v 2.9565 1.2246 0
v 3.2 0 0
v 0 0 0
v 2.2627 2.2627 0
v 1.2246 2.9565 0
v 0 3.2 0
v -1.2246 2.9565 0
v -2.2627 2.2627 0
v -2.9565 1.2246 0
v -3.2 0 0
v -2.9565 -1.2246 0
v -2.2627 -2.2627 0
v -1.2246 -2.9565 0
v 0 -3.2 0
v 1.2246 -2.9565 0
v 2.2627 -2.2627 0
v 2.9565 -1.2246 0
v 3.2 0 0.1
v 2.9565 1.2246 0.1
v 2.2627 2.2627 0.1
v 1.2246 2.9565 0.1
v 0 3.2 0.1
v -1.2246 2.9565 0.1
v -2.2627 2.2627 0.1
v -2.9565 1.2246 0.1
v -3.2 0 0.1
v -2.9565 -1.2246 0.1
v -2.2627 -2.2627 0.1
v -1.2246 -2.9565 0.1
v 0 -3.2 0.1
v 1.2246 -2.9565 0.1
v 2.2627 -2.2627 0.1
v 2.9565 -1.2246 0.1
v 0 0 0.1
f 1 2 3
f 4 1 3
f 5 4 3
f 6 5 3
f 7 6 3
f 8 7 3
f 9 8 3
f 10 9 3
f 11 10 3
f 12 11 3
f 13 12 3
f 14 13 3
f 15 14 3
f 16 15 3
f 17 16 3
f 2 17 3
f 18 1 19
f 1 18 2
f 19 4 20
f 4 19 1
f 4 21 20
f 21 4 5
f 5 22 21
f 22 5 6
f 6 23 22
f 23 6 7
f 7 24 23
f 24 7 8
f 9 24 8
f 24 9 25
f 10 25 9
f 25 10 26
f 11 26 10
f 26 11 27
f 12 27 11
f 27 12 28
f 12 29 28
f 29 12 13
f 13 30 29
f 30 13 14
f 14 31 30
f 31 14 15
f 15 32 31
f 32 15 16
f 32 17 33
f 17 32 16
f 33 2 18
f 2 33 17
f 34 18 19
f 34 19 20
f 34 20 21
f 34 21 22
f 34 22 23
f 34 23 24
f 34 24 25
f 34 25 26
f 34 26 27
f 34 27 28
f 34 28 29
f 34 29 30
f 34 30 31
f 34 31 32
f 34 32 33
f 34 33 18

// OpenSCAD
// file: ../p/4-4cyli.scad
use <../lib.scad>
function ldraw_lib__4_4cyli() = [
// 0 Cylinder 1.0
// 0 Name: 4-4cyli.dat
// 0 Author: James Jessiman
// 0 !LDRAW_ORG Primitive UPDATE 2005-01
// 0 !LICENSE Licensed under CC BY 4.0 : see CAreadme.txt
// 
// 0 BFC CERTIFY CCW
  [0,"BFC","CERTIFY"],
  [0,"BFC","CCW"],
// 
// 0 !HISTORY 1998-12-15 [PTadmin] Official Update 1998-10
// 0 !HISTORY 2002-03-23 [sbliss] Added BFC statement; merged headers from files in distributions LDraw 0.27 and Complete.
// 0 !HISTORY 2002-04-25 [PTadmin] Official Update 2002-02
// 0 !HISTORY 2004-12-14 [guyvivan] BFC CCW
// 0 !HISTORY 2005-12-28 [PTadmin] Official Update 2005-01
// 0 !HISTORY 2007-06-24 [PTadmin] Header formatted for Contributor Agreement
// 0 !HISTORY 2008-07-01 [PTadmin] Official Update 2008-01
// 
// 
// 4 16 1 1 0 0.9239 1 0.3827 0.9239 0 0.3827 1 0 0
  [4,16,1,1,0,0.9239,1,0.3827,0.9239,0,0.3827,1,0,0],
// 5 24 1 0 0 1 1 0 0.9239 0 0.3827 0.9239 0 -0.3827
  [5,24,1,0,0,1,1,0,0.9239,0,0.3827,0.9239,0,-0.3827],
// 4 16 0.9239 1 0.3827 0.7071 1 0.7071 0.7071 0 0.7071 0.9239 0 0.3827
  [4,16,0.9239,1,0.3827,0.7071,1,0.7071,0.7071,0,0.7071,0.9239,0,0.3827],
// 5 24 0.9239 0 0.3827 0.9239 1 0.3827 0.7071 0 0.7071 1 0 0
  [5,24,0.9239,0,0.3827,0.9239,1,0.3827,0.7071,0,0.7071,1,0,0],
// 4 16 0.7071 1 0.7071 0.3827 1 0.9239 0.3827 0 0.9239 0.7071 0 0.7071
  [4,16,0.7071,1,0.7071,0.3827,1,0.9239,0.3827,0,0.9239,0.7071,0,0.7071],
// 5 24 0.7071 0 0.7071 0.7071 1 0.7071 0.3827 0 0.9239 0.9239 0 0.3827
  [5,24,0.7071,0,0.7071,0.7071,1,0.7071,0.3827,0,0.9239,0.9239,0,0.3827],
// 4 16 0.3827 1 0.9239 0 1 1 0 0 1 0.3827 0 0.9239
  [4,16,0.3827,1,0.9239,0,1,1,0,0,1,0.3827,0,0.9239],
// 5 24 0.3827 0 0.9239 0.3827 1 0.9239 0 0 1 0.7071 0 0.7071
  [5,24,0.3827,0,0.9239,0.3827,1,0.9239,0,0,1,0.7071,0,0.7071],
// 4 16 0 1 1 -0.3827 1 0.9239 -0.3827 0 0.9239 0 0 1
  [4,16,0,1,1,-0.3827,1,0.9239,-0.3827,0,0.9239,0,0,1],
// 5 24 0 0 1 0 1 1 -0.3827 0 0.9239 0.3827 0 0.9239
  [5,24,0,0,1,0,1,1,-0.3827,0,0.9239,0.3827,0,0.9239],
// 4 16 -0.3827 1 0.9239 -0.7071 1 0.7071 -0.7071 0 0.7071 -0.3827 0 0.9239
  [4,16,-0.3827,1,0.9239,-0.7071,1,0.7071,-0.7071,0,0.7071,-0.3827,0,0.9239],
// 5 24 -0.3827 0 0.9239 -0.3827 1 0.9239 -0.7071 0 0.7071 0 0 1
  [5,24,-0.3827,0,0.9239,-0.3827,1,0.9239,-0.7071,0,0.7071,0,0,1],
// 4 16 -0.7071 1 0.7071 -0.9239 1 0.3827 -0.9239 0 0.3827 -0.7071 0 0.7071
  [4,16,-0.7071,1,0.7071,-0.9239,1,0.3827,-0.9239,0,0.3827,-0.7071,0,0.7071],
// 5 24 -0.7071 0 0.7071 -0.7071 1 0.7071 -0.9239 0 0.3827 -0.3827 0 0.9239
  [5,24,-0.7071,0,0.7071,-0.7071,1,0.7071,-0.9239,0,0.3827,-0.3827,0,0.9239],
// 4 16 -0.9239 1 0.3827 -1 1 0 -1 0 0 -0.9239 0 0.3827
  [4,16,-0.9239,1,0.3827,-1,1,0,-1,0,0,-0.9239,0,0.3827],
// 5 24 -0.9239 0 0.3827 -0.9239 1 0.3827 -1 0 0 -0.7071 0 0.7071
  [5,24,-0.9239,0,0.3827,-0.9239,1,0.3827,-1,0,0,-0.7071,0,0.7071],
// 4 16 -1 1 0 -0.9239 1 -0.3827 -0.9239 0 -0.3827 -1 0 0
  [4,16,-1,1,0,-0.9239,1,-0.3827,-0.9239,0,-0.3827,-1,0,0],
// 5 24 -1 0 0 -1 1 0 -0.9239 0 -0.3827 -0.9239 0 0.3827
  [5,24,-1,0,0,-1,1,0,-0.9239,0,-0.3827,-0.9239,0,0.3827],
// 4 16 -0.9239 1 -0.3827 -0.7071 1 -0.7071 -0.7071 0 -0.7071 -0.9239 0 -0.3827
  [4,16,-0.9239,1,-0.3827,-0.7071,1,-0.7071,-0.7071,0,-0.7071,-0.9239,0,-0.3827],
// 5 24 -0.9239 0 -0.3827 -0.9239 1 -0.3827 -0.7071 0 -0.7071 -1 0 0
  [5,24,-0.9239,0,-0.3827,-0.9239,1,-0.3827,-0.7071,0,-0.7071,-1,0,0],
// 4 16 -0.7071 1 -0.7071 -0.3827 1 -0.9239 -0.3827 0 -0.9239 -0.7071 0 -0.7071
  [4,16,-0.7071,1,-0.7071,-0.3827,1,-0.9239,-0.3827,0,-0.9239,-0.7071,0,-0.7071],
// 5 24 -0.7071 0 -0.7071 -0.7071 1 -0.7071 -0.3827 0 -0.9239 -0.9239 0 -0.3827
  [5,24,-0.7071,0,-0.7071,-0.7071,1,-0.7071,-0.3827,0,-0.9239,-0.9239,0,-0.3827],
// 4 16 -0.3827 1 -0.9239 0 1 -1 0 0 -1 -0.3827 0 -0.9239
  [4,16,-0.3827,1,-0.9239,0,1,-1,0,0,-1,-0.3827,0,-0.9239],
// 5 24 -0.3827 0 -0.9239 -0.3827 1 -0.9239 0 0 -1 -0.7071 0 -0.7071
  [5,24,-0.3827,0,-0.9239,-0.3827,1,-0.9239,0,0,-1,-0.7071,0,-0.7071],
// 4 16 0 1 -1 0.3827 1 -0.9239 0.3827 0 -0.9239 0 0 -1
  [4,16,0,1,-1,0.3827,1,-0.9239,0.3827,0,-0.9239,0,0,-1],
// 5 24 0 0 -1 0 1 -1 0.3827 0 -0.9239 -0.3827 0 -0.9239
  [5,24,0,0,-1,0,1,-1,0.3827,0,-0.9239,-0.3827,0,-0.9239],
// 4 16 0.3827 1 -0.9239 0.7071 1 -0.7071 0.7071 0 -0.7071 0.3827 0 -0.9239
  [4,16,0.3827,1,-0.9239,0.7071,1,-0.7071,0.7071,0,-0.7071,0.3827,0,-0.9239],
// 5 24 0.3827 0 -0.9239 0.3827 1 -0.9239 0.7071 0 -0.7071 0 0 -1
  [5,24,0.3827,0,-0.9239,0.3827,1,-0.9239,0.7071,0,-0.7071,0,0,-1],
// 4 16 0.7071 1 -0.7071 0.9239 1 -0.3827 0.9239 0 -0.3827 0.7071 0 -0.7071
  [4,16,0.7071,1,-0.7071,0.9239,1,-0.3827,0.9239,0,-0.3827,0.7071,0,-0.7071],
// 5 24 0.7071 0 -0.7071 0.7071 1 -0.7071 0.9239 0 -0.3827 0.3827 0 -0.9239
  [5,24,0.7071,0,-0.7071,0.7071,1,-0.7071,0.9239,0,-0.3827,0.3827,0,-0.9239],
// 4 16 0.9239 1 -0.3827 1 1 0 1 0 0 0.9239 0 -0.3827
  [4,16,0.9239,1,-0.3827,1,1,0,1,0,0,0.9239,0,-0.3827],
// 5 24 0.9239 0 -0.3827 0.9239 1 -0.3827 1 0 0 0.7071 0 -0.7071
  [5,24,0.9239,0,-0.3827,0.9239,1,-0.3827,1,0,0,0.7071,0,-0.7071],
// 0
];
module ldraw_lib__4_4cyli(step=0, col=false, unit=2/5, alt=false, line=0.2, solid=!$preview)
    makepoly(ldraw_lib__4_4cyli(), step=step, col=col, unit=unit, alt=alt, line=line, solid=solid);
ldraw_lib__4_4cyli(line=0.2);
// file: ../p/4-4disc.scad
use <../lib.scad>
function ldraw_lib__4_4disc() = [
// 0 Disc 1.0
// 0 Name: 4-4disc.dat
// 0 Author: James Jessiman
// 0 !LDRAW_ORG Primitive UPDATE 2002-02
// 0 !LICENSE Licensed under CC BY 4.0 : see CAreadme.txt
// 
// 0 BFC CERTIFY CCW
  [0,"BFC","CERTIFY"],
  [0,"BFC","CCW"],
// 
// 0 !HISTORY 1998-12-15 [PTadmin] Official Update 1998-10
// 0 !HISTORY 2002-03-23 [sbliss] Added BFC statement
// 0 !HISTORY 2002-04-25 [PTadmin] Official Update 2002-02
// 0 !HISTORY 2007-06-24 [PTadmin] Header formatted for Contributor Agreement
// 0 !HISTORY 2008-07-01 [PTadmin] Official Update 2008-01
// 
// 
// 3 16 0 0 0 1 0 0 0.9239 0 0.3827
  [3,16,0,0,0,1,0,0,0.9239,0,0.3827],
// 3 16 0 0 0 0.9239 0 0.3827 0.7071 0 0.7071
  [3,16,0,0,0,0.9239,0,0.3827,0.7071,0,0.7071],
// 3 16 0 0 0 0.7071 0 0.7071 0.3827 0 0.9239
  [3,16,0,0,0,0.7071,0,0.7071,0.3827,0,0.9239],
// 3 16 0 0 0 0.3827 0 0.9239 0 0 1
  [3,16,0,0,0,0.3827,0,0.9239,0,0,1],
// 3 16 0 0 0 0 0 1 -0.3827 0 0.9239
  [3,16,0,0,0,0,0,1,-0.3827,0,0.9239],
// 3 16 0 0 0 -0.3827 0 0.9239 -0.7071 0 0.7071
  [3,16,0,0,0,-0.3827,0,0.9239,-0.7071,0,0.7071],
// 3 16 0 0 0 -0.7071 0 0.7071 -0.9239 0 0.3827
  [3,16,0,0,0,-0.7071,0,0.7071,-0.9239,0,0.3827],
// 3 16 0 0 0 -0.9239 0 0.3827 -1 0 -0
  [3,16,0,0,0,-0.9239,0,0.3827,-1,0,-0],
// 3 16 0 0 0 -1 0 -0 -0.9239 0 -0.3827
  [3,16,0,0,0,-1,0,-0,-0.9239,0,-0.3827],
// 3 16 0 0 0 -0.9239 0 -0.3827 -0.7071 0 -0.7071
  [3,16,0,0,0,-0.9239,0,-0.3827,-0.7071,0,-0.7071],
// 3 16 0 0 0 -0.7071 0 -0.7071 -0.3827 0 -0.9239
  [3,16,0,0,0,-0.7071,0,-0.7071,-0.3827,0,-0.9239],
// 3 16 0 0 0 -0.3827 0 -0.9239 0 0 -1
  [3,16,0,0,0,-0.3827,0,-0.9239,0,0,-1],
// 3 16 0 0 0 0 0 -1 0.3827 0 -0.9239
  [3,16,0,0,0,0,0,-1,0.3827,0,-0.9239],
// 3 16 0 0 0 0.3827 0 -0.9239 0.7071 0 -0.7071
  [3,16,0,0,0,0.3827,0,-0.9239,0.7071,0,-0.7071],
// 3 16 0 0 0 0.7071 0 -0.7071 0.9239 0 -0.3827
  [3,16,0,0,0,0.7071,0,-0.7071,0.9239,0,-0.3827],
// 3 16 0 0 0 0.9239 0 -0.3827 1 0 0
  [3,16,0,0,0,0.9239,0,-0.3827,1,0,0],
// 0
];
module ldraw_lib__4_4disc(step=0, col=false, unit=2/5, alt=false, line=0.2, solid=!$preview)
    makepoly(ldraw_lib__4_4disc(), step=step, col=col, unit=unit, alt=alt, line=line, solid=solid);
ldraw_lib__4_4disc(line=0.2);
// file: ../p/4-4cylc3.scad
use <../lib.scad>
use <4-4cyli.scad>
use <4-4disc.scad>
function ldraw_lib__4_4cylc3() = [
// 0 Cylinder Closed 1.0 without Top or Bottom Edge Lines
// 0 Name: 4-4cylc3.dat
// 0 Author: Chris Dee [cwdee]
// 0 !LDRAW_ORG Primitive UPDATE 2017-01
// 0 !LICENSE Licensed under CC BY 4.0 : see CAreadme.txt
// 
// 0 BFC CERTIFY CCW
  [0,"BFC","CERTIFY"],
  [0,"BFC","CCW"],
// 
// 0 !HISTORY 2017-12-30 [PTadmin] Official Update 2017-01
// 
// 
// 1 16 0 0 0 1 0 0 0 1 0 0 0 1 4-4disc.dat
  [1,16,0,0,0,1,0,0,0,1,0,0,0,1, ldraw_lib__4_4disc()],
// 1 16 0 0 0 1 0 0 0 1 0 0 0 1 4-4cyli.dat
  [1,16,0,0,0,1,0,0,0,1,0,0,0,1, ldraw_lib__4_4cyli()],
// 0
];
module ldraw_lib__4_4cylc3(step=0, col=false, unit=2/5, alt=false, line=0.2, solid=!$preview)
    makepoly(ldraw_lib__4_4cylc3(), step=step, col=col, unit=unit, alt=alt, line=line, solid=solid);
ldraw_lib__4_4cylc3(line=0.2);
// main file
use <../lib.scad>
use <../p/4-4cylc3.scad>
use <../p/4-4disc.scad>
function ldraw_lib__4566038a() = [
// 0 Sticker  0.8 x  0.8 Round with Red Surface
// 0 Name: 4566038a.dat
// 0 Author: Gabriel Läufer [Dr.Bricktacular]
// 0 !LDRAW_ORG Part UPDATE 2025-11
// 0 !LICENSE Licensed under CC BY 4.0 : see CAreadme.txt
// 
// 0 BFC CERTIFY CCW
  [0,"BFC","CERTIFY"],
  [0,"BFC","CCW"],
// 
// 0 !KEYWORDS Bricklink 7592stk01, Brickowl 691898, Construct-a-Buzz
// 0 !KEYWORDS Rebrickable 88146, set 7592, Toy Story
// 
// 0 !HISTORY 2025-11-30 [OrionP] Official Update 2025-11
// 
// 0 // Sticker-Bottom
// 1 16 0 0 0 8 0 0 0 -0.25 0 0 0 8 4-4cylc3.dat
  [1,16,0,0,0,8,0,0,0,-0.25,0,0,0,8, ldraw_lib__4_4cylc3()],
// 
// 0 // Sticker-Front
// 1 4 0 -.25 0 8 0 0 0 1 0 0 0 8 4-4disc.dat
  [1,4,0,-.25,0,8,0,0,0,1,0,0,0,8, ldraw_lib__4_4disc()],
];
module ldraw_lib__4566038a(step=0, col=false, unit=2/5, alt=false, line=0.2, solid=!$preview)
    makepoly(ldraw_lib__4566038a(), step=step, col=col, unit=unit, alt=alt, line=line, solid=solid);
ldraw_lib__4566038a(line=0.2);
